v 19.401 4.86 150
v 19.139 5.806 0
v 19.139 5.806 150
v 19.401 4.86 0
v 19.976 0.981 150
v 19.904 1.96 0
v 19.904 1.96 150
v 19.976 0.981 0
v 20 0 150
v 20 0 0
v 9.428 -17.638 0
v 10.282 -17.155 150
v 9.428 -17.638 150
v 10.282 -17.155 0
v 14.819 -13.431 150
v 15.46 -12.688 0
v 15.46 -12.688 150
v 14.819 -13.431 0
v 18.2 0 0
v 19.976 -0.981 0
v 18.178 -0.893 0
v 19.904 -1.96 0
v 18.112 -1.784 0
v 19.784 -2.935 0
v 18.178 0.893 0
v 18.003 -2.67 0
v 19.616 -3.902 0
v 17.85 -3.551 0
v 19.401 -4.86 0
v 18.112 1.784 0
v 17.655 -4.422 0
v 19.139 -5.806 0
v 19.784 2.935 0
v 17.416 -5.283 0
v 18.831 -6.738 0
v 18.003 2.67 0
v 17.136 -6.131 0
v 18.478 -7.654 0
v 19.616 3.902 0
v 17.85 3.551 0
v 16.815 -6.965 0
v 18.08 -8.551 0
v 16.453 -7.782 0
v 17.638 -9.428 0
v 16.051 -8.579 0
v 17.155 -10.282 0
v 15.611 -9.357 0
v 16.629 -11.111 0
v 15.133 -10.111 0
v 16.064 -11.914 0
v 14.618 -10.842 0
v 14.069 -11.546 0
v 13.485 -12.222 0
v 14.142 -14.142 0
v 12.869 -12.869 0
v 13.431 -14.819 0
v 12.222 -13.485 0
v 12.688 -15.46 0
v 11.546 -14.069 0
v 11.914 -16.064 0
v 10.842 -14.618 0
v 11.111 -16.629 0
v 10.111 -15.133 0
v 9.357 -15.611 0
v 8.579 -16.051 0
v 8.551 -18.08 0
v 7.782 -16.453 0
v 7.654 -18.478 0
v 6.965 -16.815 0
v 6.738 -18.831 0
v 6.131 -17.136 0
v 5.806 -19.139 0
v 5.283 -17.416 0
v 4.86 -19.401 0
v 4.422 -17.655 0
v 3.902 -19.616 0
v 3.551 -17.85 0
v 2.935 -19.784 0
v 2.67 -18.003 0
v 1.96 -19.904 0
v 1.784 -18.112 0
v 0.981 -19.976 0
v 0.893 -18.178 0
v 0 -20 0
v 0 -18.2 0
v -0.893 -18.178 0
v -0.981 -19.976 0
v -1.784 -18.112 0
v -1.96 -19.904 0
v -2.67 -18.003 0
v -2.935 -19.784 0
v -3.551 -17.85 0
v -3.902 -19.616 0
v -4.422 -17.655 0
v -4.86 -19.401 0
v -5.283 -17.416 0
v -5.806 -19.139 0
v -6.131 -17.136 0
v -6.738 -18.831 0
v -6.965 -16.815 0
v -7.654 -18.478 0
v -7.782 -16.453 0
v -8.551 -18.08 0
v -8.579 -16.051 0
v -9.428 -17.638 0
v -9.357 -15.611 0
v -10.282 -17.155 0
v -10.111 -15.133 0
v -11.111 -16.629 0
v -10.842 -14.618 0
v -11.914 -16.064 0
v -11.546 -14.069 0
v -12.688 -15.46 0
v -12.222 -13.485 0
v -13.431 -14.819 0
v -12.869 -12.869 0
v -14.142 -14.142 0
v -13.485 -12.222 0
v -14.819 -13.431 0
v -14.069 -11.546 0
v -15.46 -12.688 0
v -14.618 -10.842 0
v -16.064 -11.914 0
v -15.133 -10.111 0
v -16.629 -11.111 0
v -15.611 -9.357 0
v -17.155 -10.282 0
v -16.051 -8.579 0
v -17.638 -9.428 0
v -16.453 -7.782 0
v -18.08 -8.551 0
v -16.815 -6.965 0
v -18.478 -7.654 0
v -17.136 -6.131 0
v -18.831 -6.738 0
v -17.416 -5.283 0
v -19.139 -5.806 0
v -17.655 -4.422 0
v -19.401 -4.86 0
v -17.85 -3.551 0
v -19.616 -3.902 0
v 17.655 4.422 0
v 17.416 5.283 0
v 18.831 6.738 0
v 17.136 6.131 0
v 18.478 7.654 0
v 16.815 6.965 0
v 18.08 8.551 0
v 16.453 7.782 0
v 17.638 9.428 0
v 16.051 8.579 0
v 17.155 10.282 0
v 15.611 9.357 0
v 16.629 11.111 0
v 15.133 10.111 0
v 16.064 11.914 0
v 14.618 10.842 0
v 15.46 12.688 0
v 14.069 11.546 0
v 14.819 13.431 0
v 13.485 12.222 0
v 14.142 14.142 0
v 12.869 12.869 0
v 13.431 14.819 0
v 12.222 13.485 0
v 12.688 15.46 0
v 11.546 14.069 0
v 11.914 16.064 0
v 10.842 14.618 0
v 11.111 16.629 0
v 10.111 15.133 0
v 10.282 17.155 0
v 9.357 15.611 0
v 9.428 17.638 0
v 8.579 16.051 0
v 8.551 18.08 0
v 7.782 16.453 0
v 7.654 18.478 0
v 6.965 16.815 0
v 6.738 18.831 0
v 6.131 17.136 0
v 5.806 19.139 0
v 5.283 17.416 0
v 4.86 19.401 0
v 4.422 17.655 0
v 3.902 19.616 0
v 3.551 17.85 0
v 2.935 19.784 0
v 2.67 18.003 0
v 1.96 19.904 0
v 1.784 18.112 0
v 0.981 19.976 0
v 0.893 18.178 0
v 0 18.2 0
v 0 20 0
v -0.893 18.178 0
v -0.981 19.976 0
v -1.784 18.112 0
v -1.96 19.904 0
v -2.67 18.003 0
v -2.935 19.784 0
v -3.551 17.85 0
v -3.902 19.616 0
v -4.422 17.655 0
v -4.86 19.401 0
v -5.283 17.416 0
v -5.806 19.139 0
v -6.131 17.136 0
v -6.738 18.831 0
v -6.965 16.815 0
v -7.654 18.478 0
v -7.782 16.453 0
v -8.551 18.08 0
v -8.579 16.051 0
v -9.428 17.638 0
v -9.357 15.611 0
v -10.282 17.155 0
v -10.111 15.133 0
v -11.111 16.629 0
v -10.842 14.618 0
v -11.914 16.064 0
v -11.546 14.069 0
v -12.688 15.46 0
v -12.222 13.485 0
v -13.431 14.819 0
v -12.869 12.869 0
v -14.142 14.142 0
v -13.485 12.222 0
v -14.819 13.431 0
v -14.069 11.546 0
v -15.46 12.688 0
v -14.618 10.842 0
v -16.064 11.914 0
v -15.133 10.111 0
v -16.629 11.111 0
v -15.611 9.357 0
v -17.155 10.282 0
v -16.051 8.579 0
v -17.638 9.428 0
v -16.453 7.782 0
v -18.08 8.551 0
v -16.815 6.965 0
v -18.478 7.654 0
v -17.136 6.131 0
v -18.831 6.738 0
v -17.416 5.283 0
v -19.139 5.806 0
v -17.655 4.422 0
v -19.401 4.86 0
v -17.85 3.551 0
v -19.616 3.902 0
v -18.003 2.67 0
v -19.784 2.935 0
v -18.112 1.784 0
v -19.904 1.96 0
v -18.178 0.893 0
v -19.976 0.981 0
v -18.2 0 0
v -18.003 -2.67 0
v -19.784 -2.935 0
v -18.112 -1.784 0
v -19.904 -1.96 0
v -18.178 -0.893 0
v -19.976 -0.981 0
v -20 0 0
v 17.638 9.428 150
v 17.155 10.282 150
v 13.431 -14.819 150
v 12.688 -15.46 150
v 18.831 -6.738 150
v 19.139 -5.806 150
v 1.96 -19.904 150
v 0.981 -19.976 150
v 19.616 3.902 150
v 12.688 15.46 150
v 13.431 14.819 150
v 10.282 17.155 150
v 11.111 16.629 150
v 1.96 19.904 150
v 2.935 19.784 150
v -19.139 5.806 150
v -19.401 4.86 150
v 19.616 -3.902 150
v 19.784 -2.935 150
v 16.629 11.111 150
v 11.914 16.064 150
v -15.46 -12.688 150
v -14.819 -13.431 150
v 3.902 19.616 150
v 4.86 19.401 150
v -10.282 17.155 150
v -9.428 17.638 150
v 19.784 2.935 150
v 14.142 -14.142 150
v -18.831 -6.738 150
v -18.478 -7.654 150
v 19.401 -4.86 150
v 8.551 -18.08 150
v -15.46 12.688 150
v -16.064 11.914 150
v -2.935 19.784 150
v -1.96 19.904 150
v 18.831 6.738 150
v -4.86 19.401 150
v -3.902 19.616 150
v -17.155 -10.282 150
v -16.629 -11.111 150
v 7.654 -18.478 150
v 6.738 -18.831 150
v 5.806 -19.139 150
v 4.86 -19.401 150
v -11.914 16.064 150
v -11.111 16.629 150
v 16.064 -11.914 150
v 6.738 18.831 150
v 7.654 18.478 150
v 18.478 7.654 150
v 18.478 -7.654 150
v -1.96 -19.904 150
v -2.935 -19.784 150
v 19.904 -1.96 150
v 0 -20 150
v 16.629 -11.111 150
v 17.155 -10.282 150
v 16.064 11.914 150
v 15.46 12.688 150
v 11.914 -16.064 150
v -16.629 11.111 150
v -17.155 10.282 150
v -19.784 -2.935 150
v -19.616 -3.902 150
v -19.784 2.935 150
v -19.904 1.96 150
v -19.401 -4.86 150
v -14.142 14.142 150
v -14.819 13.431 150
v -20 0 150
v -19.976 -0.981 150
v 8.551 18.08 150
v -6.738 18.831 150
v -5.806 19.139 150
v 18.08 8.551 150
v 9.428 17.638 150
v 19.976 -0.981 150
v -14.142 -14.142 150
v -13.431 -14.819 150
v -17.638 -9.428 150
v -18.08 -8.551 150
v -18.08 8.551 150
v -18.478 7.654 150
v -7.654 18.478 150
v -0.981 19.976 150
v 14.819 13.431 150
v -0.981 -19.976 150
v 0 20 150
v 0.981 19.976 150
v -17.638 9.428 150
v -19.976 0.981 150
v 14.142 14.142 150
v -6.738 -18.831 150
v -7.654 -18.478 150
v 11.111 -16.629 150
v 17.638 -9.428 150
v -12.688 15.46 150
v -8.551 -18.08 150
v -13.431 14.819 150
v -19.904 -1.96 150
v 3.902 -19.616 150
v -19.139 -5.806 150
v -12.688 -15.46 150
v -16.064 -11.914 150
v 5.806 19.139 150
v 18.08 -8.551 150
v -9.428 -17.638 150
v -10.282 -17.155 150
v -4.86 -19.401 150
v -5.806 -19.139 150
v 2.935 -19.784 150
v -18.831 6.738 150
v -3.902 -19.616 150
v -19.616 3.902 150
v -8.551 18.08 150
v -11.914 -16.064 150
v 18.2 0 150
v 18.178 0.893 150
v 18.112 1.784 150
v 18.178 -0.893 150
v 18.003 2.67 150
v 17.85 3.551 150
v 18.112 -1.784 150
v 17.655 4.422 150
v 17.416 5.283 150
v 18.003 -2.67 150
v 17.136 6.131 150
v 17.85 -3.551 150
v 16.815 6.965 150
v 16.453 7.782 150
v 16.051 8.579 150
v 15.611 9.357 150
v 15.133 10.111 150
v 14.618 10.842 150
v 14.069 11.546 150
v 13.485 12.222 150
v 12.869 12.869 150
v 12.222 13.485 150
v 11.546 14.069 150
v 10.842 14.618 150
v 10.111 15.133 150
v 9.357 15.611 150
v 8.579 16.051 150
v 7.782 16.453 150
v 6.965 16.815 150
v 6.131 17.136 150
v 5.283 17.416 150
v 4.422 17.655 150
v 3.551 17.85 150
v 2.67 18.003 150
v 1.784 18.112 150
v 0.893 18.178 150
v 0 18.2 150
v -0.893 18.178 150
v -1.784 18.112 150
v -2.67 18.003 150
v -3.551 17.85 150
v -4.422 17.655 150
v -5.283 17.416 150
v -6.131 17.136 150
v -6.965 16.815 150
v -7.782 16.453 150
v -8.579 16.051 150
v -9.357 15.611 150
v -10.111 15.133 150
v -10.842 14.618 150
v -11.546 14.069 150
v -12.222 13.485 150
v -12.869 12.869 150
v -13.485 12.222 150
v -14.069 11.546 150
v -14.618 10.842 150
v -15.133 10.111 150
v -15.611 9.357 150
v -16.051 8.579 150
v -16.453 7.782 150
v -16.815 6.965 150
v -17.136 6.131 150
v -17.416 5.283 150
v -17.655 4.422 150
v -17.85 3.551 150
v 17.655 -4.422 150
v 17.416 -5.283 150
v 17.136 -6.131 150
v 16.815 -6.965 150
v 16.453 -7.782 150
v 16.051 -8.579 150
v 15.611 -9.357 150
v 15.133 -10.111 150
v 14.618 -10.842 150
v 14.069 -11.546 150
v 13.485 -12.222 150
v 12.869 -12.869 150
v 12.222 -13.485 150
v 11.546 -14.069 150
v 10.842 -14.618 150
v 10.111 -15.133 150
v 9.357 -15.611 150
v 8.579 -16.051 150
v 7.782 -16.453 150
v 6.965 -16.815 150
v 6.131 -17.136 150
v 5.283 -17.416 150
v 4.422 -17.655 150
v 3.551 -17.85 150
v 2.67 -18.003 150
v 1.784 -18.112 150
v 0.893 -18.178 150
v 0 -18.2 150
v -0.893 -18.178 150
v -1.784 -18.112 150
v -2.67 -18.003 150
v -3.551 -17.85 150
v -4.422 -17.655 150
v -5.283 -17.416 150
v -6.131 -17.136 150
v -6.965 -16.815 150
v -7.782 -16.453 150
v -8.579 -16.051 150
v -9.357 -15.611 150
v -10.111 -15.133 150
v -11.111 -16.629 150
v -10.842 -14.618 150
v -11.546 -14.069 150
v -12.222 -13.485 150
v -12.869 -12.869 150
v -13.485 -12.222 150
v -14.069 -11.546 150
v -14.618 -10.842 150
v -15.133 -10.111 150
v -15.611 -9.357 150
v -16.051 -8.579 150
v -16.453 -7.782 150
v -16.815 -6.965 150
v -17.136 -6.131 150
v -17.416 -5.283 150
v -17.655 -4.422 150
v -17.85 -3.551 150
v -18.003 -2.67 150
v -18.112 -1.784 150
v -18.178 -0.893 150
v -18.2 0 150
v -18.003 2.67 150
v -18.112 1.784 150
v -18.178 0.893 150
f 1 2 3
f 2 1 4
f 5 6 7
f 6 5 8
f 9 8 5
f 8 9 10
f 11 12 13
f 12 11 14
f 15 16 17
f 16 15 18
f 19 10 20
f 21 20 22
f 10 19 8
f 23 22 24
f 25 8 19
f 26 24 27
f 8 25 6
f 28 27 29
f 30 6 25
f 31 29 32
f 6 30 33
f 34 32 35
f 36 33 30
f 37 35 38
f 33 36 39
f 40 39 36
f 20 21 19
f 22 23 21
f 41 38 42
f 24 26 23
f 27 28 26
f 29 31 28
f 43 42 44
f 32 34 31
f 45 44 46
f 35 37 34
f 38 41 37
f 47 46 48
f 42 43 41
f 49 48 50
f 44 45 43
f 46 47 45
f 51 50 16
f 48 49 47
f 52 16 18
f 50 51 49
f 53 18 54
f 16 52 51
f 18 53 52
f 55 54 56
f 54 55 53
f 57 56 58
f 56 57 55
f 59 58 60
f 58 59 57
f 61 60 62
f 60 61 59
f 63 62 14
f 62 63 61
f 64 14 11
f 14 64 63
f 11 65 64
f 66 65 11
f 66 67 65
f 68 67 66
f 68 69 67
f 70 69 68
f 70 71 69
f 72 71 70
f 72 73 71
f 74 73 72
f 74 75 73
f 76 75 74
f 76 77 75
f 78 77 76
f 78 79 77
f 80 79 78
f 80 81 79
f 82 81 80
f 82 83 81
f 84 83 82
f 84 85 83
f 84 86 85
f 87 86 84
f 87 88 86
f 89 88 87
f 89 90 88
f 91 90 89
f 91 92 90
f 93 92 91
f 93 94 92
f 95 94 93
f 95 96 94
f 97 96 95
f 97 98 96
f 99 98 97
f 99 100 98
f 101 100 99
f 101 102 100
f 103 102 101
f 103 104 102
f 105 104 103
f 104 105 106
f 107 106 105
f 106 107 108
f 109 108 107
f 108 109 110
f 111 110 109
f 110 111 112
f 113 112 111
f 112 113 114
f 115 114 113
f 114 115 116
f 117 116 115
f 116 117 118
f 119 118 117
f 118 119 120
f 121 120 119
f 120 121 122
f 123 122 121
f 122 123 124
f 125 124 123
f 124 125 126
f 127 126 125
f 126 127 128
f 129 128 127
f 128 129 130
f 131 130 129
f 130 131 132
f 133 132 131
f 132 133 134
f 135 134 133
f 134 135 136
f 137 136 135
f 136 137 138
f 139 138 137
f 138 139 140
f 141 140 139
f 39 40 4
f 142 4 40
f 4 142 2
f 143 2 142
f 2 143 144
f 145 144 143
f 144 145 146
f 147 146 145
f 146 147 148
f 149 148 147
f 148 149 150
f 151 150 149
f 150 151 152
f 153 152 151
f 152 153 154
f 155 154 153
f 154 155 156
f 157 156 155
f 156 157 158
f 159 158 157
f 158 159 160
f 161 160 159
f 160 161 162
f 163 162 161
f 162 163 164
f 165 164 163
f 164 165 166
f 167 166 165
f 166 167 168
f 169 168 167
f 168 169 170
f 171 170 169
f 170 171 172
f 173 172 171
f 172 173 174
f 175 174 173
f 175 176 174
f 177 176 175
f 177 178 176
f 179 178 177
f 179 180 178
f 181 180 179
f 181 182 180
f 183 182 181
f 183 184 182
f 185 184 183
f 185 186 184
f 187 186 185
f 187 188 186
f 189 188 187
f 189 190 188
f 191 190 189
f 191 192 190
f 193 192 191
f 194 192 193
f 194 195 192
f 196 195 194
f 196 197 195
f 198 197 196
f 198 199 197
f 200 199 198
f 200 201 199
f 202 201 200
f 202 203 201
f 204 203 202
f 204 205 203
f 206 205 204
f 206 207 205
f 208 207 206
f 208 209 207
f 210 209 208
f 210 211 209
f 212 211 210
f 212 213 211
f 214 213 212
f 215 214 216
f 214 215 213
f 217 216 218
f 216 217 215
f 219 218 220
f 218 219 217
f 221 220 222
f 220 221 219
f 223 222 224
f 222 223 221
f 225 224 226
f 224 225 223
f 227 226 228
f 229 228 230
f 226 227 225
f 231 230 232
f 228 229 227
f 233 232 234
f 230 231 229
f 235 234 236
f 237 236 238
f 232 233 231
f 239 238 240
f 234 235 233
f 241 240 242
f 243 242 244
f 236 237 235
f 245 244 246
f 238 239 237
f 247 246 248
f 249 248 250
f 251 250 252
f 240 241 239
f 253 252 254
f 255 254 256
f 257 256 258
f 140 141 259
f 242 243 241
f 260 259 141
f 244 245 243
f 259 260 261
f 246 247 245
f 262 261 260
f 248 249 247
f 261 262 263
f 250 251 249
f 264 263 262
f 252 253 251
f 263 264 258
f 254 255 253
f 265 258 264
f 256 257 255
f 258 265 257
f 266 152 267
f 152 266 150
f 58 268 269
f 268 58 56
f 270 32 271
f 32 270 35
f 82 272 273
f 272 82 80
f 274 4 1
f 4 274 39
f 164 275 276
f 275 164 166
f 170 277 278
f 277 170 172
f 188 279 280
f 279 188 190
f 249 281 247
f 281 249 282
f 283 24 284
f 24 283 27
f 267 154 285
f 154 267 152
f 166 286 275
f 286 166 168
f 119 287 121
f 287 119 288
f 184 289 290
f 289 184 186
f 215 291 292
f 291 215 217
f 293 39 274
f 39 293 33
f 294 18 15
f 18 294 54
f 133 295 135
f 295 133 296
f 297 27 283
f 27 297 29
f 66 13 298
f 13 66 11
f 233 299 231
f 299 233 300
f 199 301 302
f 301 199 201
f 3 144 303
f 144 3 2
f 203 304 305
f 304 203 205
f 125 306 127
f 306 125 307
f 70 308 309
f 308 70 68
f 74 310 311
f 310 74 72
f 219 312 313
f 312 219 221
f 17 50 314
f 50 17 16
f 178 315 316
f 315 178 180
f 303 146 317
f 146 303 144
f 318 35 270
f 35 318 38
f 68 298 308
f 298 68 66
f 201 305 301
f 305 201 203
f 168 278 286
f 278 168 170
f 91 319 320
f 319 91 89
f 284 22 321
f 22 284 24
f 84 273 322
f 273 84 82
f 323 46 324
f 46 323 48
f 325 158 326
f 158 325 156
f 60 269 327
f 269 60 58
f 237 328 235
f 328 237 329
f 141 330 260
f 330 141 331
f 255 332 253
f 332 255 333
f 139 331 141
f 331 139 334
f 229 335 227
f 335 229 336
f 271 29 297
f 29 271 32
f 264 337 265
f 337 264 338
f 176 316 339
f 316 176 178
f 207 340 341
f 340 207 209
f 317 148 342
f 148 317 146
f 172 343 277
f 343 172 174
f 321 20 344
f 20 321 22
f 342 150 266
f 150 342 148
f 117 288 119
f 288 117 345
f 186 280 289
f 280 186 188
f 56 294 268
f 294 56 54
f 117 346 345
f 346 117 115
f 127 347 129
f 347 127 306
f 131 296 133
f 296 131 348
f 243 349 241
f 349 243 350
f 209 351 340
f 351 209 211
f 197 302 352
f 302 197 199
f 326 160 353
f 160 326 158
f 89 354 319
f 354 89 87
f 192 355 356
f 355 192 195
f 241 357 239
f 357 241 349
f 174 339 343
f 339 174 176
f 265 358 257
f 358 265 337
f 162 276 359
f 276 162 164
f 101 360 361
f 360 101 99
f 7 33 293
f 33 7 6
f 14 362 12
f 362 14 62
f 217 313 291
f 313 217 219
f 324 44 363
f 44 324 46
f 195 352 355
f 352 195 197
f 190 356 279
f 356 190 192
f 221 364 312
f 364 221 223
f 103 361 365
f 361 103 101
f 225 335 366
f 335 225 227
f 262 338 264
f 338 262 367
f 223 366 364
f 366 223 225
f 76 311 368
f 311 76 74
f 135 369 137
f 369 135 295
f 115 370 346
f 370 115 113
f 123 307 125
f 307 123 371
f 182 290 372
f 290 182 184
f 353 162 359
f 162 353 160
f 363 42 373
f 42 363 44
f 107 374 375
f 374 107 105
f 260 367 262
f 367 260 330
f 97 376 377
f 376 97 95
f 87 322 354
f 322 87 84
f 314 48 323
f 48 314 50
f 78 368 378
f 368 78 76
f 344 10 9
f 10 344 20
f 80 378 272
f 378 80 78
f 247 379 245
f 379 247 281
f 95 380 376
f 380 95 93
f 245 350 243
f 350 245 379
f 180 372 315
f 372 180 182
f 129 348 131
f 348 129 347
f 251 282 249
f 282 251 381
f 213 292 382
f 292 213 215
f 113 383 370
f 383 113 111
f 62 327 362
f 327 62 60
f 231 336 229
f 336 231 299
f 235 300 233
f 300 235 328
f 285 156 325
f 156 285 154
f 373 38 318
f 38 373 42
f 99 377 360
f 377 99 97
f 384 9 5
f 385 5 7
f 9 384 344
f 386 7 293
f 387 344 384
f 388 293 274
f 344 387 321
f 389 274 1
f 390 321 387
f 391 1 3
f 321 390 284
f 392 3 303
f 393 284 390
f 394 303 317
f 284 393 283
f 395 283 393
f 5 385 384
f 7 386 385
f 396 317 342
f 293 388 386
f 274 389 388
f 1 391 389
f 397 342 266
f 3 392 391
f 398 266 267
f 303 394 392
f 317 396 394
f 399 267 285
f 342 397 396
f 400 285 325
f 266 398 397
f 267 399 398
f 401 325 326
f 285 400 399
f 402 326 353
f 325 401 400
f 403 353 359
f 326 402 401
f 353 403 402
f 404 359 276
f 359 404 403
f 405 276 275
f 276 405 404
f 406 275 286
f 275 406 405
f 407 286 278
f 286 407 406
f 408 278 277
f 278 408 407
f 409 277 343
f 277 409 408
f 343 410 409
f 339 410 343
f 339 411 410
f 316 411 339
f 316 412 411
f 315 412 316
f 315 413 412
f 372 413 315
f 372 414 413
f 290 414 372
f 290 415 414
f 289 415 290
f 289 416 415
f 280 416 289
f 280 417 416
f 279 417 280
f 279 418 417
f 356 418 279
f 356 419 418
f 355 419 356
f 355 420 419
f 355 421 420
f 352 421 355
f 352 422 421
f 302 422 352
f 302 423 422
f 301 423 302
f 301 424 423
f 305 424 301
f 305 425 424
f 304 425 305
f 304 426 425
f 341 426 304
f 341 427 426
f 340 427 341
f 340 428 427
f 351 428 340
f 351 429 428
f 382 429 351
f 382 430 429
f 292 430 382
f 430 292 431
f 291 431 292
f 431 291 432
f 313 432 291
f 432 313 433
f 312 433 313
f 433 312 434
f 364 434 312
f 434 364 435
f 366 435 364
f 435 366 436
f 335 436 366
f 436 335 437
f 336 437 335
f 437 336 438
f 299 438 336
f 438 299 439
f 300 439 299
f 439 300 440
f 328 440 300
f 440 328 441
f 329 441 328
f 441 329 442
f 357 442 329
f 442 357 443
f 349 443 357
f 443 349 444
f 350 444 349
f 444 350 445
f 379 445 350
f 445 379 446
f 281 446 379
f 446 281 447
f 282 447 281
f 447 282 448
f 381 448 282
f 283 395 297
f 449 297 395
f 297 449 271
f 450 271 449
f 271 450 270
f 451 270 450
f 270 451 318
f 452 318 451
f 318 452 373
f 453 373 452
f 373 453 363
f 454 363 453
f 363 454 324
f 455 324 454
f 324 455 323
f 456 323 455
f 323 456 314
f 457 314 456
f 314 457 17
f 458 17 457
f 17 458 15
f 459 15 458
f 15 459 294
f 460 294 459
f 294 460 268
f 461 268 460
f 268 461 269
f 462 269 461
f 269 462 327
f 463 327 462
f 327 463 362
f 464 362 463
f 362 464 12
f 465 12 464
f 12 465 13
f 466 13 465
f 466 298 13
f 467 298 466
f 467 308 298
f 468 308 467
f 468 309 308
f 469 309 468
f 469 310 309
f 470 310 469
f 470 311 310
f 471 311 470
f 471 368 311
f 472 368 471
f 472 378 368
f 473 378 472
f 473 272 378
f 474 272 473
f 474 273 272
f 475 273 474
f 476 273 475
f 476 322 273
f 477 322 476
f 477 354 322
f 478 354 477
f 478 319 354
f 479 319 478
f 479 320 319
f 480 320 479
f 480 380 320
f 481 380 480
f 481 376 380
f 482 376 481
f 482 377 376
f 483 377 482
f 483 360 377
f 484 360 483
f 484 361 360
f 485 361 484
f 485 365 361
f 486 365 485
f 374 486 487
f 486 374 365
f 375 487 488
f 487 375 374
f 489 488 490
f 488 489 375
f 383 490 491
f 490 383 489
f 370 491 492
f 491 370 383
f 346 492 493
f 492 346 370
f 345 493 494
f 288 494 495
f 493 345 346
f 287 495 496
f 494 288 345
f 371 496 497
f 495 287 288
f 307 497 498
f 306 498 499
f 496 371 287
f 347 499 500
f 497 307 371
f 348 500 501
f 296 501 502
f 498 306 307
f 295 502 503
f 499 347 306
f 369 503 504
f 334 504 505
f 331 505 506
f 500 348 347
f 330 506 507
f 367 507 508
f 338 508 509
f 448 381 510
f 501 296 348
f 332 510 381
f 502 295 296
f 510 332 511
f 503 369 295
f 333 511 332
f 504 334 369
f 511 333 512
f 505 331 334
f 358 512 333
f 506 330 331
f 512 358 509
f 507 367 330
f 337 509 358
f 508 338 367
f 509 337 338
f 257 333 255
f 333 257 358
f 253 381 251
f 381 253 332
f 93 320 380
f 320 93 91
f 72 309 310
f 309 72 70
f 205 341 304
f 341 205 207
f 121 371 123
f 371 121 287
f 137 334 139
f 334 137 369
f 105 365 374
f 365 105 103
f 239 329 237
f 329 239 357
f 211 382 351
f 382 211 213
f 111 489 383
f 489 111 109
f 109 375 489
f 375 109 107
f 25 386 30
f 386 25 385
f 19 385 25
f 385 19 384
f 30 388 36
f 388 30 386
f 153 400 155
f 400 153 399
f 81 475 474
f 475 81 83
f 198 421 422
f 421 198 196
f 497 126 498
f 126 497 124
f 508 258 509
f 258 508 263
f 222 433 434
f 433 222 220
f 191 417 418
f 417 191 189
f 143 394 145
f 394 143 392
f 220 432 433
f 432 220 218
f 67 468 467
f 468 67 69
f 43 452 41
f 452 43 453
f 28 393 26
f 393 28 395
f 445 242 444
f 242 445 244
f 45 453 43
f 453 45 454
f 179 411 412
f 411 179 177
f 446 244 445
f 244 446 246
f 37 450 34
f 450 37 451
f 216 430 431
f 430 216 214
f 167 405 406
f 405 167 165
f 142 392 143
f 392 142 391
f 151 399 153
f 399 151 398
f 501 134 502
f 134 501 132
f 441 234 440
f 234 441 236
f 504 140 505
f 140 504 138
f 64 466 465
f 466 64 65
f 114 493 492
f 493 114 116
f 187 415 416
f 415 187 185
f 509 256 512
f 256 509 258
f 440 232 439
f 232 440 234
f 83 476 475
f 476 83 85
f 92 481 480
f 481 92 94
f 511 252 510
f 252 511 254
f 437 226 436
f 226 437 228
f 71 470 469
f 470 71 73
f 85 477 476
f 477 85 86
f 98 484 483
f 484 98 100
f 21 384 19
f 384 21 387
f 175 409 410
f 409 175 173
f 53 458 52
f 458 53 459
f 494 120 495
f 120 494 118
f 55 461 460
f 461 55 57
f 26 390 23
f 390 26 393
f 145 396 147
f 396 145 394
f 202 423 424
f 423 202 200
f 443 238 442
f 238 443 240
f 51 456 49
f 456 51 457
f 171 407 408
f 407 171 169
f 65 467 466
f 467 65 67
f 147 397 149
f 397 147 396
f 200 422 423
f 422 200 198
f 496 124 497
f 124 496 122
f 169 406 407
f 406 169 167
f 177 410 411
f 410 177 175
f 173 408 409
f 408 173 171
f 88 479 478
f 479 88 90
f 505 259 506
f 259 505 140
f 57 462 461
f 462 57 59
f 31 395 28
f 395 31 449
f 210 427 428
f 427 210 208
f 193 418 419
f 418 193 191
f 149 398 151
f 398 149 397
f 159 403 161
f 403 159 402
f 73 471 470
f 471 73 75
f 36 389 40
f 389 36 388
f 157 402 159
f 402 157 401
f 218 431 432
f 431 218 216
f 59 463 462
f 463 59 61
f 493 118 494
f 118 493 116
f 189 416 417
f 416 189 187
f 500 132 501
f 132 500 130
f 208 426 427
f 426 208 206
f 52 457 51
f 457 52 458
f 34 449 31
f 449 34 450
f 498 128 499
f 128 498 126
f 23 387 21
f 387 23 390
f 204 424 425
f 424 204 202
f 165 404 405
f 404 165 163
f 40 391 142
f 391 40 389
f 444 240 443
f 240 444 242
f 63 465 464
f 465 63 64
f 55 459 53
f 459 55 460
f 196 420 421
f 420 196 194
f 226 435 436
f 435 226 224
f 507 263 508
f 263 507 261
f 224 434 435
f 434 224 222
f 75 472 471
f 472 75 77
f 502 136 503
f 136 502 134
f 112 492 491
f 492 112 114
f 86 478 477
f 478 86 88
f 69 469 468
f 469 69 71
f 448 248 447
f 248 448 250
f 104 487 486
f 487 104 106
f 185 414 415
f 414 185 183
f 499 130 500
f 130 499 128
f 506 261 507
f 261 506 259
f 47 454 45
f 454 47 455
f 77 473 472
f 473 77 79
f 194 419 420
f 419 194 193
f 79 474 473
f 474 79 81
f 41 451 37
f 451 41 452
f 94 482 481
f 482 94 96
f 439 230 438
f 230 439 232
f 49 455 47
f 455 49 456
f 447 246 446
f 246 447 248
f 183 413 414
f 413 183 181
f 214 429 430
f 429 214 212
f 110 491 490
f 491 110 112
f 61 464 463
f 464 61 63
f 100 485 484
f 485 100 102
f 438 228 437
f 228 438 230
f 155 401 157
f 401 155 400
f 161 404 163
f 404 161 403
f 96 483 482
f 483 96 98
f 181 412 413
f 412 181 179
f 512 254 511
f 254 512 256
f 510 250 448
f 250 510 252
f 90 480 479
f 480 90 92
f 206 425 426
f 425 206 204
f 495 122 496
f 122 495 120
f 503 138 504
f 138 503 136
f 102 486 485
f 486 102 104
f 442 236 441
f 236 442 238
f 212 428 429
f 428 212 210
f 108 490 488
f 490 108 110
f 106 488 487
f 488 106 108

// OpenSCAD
$fn = 128;

// HT 40 pipe (approx): OD 40 mm, wall 1.8 mm, length 150 mm
od = 40;
wall = 1.8;
id = od - 2*wall;
len = 150;

difference() {
  cylinder(h = len, d = od);
  translate([0,0,-0.1]) cylinder(h = len + 0.2, d = id);
}
